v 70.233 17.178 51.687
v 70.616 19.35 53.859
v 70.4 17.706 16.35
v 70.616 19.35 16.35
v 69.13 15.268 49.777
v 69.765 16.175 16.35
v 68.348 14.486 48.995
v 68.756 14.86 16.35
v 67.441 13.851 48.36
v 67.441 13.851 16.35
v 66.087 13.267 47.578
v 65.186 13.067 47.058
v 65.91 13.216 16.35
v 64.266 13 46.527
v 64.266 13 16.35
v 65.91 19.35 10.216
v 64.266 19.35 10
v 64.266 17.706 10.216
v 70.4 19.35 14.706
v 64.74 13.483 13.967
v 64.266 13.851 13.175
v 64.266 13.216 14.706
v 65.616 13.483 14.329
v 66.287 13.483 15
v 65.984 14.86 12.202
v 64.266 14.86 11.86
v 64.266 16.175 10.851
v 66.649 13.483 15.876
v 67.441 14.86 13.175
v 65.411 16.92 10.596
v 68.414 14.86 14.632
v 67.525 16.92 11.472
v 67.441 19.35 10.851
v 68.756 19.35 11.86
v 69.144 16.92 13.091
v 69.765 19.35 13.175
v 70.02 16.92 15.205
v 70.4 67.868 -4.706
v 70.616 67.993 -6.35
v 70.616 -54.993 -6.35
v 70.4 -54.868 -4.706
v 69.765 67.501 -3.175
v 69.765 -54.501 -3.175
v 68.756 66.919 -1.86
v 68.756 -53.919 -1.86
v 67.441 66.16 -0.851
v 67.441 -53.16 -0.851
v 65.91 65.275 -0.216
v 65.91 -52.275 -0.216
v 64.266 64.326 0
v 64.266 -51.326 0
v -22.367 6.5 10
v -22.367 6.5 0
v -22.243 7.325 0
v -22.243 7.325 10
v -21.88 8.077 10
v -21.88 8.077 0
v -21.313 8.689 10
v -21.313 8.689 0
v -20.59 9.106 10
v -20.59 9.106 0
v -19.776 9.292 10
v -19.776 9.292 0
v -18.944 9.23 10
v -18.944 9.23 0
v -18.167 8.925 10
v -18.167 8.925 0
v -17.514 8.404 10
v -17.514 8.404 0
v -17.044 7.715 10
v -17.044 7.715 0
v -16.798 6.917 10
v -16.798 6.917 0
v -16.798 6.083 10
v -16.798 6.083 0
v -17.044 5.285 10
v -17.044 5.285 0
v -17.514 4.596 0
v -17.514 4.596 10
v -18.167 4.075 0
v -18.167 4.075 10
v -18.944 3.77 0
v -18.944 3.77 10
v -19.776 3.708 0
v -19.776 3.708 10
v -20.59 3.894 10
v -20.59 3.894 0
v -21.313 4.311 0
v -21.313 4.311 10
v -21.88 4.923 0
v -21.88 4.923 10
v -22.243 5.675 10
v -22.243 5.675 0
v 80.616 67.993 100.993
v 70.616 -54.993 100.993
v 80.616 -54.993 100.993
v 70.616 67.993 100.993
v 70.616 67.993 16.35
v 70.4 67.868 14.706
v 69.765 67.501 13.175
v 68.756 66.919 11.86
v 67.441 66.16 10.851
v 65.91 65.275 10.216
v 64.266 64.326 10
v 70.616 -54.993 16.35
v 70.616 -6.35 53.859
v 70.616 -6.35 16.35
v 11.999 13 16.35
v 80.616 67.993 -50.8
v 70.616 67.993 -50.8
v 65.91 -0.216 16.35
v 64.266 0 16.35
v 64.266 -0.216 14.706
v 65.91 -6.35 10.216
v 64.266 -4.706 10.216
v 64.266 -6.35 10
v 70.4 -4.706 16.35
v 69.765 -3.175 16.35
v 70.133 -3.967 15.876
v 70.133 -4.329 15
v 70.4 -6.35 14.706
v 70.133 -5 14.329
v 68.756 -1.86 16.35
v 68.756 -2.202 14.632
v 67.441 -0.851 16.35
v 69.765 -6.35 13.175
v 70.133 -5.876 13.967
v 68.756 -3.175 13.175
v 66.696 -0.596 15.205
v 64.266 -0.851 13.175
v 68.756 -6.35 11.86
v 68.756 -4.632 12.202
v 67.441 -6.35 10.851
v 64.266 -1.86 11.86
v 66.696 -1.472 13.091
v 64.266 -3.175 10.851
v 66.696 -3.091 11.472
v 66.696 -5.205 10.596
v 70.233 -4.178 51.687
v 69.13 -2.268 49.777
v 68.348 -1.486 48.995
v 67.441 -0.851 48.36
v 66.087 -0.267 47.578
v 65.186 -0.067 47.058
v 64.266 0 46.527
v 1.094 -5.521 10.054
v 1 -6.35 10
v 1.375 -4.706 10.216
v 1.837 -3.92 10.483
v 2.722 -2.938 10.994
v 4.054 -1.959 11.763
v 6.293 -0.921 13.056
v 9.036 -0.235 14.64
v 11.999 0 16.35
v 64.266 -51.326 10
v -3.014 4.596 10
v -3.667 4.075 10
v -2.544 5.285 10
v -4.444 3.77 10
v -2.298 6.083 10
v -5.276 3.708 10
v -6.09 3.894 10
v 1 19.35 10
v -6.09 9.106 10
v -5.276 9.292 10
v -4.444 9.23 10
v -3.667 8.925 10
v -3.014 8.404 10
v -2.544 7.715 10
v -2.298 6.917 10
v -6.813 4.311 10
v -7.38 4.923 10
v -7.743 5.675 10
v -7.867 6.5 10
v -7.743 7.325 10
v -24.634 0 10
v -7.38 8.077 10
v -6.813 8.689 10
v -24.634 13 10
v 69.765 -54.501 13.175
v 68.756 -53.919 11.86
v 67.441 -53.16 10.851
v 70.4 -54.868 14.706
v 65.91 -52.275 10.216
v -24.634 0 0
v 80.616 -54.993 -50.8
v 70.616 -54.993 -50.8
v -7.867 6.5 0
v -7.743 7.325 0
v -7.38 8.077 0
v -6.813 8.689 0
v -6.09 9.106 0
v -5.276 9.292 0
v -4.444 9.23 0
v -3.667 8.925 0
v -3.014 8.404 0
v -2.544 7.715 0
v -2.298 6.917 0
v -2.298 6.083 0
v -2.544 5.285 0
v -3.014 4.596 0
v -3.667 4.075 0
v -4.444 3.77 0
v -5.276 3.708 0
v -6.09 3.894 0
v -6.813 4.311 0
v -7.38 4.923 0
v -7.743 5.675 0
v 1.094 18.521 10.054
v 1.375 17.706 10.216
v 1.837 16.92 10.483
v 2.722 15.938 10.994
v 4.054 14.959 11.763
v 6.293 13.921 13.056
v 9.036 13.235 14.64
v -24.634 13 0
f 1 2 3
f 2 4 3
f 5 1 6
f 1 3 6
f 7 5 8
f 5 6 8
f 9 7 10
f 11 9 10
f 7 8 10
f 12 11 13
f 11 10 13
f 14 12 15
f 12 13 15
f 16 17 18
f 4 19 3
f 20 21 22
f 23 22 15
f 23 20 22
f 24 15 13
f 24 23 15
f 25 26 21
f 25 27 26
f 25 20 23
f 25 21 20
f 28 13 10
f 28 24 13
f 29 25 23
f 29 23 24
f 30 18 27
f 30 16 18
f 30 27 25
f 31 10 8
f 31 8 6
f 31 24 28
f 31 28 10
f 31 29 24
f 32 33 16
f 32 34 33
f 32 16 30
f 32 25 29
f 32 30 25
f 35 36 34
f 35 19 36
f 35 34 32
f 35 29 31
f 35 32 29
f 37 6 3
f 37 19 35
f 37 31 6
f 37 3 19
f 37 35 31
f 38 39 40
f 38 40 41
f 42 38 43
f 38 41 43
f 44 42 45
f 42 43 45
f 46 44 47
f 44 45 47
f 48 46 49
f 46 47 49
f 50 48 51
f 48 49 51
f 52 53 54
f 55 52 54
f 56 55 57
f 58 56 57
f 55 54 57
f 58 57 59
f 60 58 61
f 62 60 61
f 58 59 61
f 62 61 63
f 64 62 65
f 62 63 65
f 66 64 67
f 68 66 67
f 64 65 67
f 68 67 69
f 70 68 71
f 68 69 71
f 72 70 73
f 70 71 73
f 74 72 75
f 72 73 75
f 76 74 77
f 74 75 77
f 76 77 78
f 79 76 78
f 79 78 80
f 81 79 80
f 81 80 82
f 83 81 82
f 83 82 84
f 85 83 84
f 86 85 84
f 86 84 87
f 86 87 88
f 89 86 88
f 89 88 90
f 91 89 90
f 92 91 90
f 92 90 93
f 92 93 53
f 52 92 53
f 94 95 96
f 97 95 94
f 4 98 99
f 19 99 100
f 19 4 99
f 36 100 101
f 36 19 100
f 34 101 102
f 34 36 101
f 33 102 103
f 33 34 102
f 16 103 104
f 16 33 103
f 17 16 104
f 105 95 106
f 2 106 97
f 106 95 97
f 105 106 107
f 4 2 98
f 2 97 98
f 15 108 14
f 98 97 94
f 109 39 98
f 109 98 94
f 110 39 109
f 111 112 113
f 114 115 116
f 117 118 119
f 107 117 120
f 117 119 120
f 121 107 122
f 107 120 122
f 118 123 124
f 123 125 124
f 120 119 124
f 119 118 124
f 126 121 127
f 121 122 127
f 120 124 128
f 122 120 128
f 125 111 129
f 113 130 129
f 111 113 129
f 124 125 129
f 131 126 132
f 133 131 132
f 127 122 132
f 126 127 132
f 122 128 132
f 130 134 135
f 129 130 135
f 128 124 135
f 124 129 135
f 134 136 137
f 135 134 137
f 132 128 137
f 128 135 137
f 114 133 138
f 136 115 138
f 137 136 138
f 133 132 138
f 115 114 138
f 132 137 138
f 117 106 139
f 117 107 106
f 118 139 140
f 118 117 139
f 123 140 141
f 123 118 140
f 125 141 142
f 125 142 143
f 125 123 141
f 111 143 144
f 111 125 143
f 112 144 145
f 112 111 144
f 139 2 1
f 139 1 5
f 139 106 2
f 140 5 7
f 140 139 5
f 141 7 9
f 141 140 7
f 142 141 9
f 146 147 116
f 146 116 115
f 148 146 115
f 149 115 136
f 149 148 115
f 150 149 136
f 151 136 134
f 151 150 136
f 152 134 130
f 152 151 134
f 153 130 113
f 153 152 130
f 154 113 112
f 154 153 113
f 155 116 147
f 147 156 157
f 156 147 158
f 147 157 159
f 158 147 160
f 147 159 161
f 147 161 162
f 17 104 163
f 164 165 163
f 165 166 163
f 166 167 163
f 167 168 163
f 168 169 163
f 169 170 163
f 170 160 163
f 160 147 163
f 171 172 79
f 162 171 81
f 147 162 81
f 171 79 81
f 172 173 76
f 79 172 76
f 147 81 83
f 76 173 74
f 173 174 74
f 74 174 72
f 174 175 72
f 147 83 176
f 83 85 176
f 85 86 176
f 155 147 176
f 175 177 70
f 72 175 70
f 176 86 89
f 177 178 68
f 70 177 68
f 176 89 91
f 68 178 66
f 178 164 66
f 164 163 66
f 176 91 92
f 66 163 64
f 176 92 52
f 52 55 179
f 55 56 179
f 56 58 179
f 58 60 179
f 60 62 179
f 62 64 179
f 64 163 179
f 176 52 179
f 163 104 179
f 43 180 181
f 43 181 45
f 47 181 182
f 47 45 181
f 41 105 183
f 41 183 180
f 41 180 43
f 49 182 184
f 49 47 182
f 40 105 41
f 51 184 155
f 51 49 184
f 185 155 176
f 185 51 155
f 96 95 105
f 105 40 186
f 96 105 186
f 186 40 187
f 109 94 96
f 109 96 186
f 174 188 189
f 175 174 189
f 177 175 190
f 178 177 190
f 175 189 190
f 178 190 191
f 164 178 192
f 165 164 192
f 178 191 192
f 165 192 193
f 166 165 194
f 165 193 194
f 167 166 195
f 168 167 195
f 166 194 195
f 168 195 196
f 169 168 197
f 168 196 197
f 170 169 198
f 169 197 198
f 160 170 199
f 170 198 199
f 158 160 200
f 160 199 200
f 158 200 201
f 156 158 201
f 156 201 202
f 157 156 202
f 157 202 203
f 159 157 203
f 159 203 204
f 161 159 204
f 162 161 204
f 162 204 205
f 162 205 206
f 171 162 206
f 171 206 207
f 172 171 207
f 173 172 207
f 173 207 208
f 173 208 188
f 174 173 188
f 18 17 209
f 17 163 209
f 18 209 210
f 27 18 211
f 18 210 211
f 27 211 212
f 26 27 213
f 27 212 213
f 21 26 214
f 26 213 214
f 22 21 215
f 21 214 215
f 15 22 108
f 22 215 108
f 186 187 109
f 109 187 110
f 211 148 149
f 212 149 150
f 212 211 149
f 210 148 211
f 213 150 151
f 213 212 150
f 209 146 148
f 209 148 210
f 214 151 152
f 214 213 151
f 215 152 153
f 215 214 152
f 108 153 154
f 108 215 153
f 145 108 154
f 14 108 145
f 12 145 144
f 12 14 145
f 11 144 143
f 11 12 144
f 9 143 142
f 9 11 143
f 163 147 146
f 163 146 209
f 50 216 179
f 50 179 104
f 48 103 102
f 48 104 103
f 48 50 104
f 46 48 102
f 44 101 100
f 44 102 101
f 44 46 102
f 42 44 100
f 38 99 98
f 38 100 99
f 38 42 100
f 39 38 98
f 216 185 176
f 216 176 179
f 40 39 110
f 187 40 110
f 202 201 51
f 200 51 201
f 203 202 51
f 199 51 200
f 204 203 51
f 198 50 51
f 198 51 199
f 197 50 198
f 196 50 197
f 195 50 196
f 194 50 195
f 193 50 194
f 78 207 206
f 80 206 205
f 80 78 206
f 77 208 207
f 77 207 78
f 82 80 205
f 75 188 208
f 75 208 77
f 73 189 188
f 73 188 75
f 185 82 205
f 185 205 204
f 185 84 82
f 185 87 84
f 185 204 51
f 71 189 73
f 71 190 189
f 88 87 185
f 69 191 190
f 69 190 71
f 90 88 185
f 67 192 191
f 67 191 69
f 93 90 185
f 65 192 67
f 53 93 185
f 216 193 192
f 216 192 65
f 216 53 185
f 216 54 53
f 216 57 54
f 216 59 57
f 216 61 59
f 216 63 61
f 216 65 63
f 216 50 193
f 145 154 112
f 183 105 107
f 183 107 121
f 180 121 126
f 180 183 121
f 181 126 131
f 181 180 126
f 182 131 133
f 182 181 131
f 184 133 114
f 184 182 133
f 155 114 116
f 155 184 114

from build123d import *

# Parameters (mm, degrees)
BOSS_EXTRUDE1_DEPTH = 10
BOSS_EXTRUDE2_DEPTH = 13
SKETCH4_W           = 151.79281634
SKETCH4_H           = 122.98522628
BOSS_EXTRUDE3_DEPTH = 10
SKETCH5_R           = 2.8
CUT_EXTRUDE1_DEPTH  = 101.99281634
FILLET1_R           = 6.35


with BuildPart() as part:
    # Sketch1 → Boss-Extrude1 (new body)
    with BuildSketch(Plane.XY):
        Polygon((-24.634, 0), (-24.634, 13), (70.616, 67.99261314), (70.616, -54.99261314), align=None)
    extrude(amount=BOSS_EXTRUDE1_DEPTH)

    # Sketch3 → Boss-Extrude2 (add)
    with BuildSketch(Plane(origin=(0, 13, 0), x_dir=(1, 0, 0), z_dir=(0, 1, 0))):
        Polygon((70.616, -50.19281634), (70.616, -10), (1, -10), align=None)
    extrude(amount=-BOSS_EXTRUDE2_DEPTH)

    # Sketch4 → Boss-Extrude3 (add)
    with BuildSketch(Plane(origin=(70.616, 0, 0), x_dir=(0, 0, -1), z_dir=(1, 0, 0))):
        with Locations((-25.09640817, 6.5)):
            Rectangle(SKETCH4_W, SKETCH4_H)
    extrude(amount=BOSS_EXTRUDE3_DEPTH)

    # Sketch5 → Cut-Extrude1 (cut, through all)
    with BuildSketch(Plane(origin=(0, 0, 0), x_dir=(-1, 0, 0), z_dir=(0, 0, -1))):
        with Locations((5.067, 6.5)):
            Circle(SKETCH5_R)
        with Locations((19.567, 6.5)):
            Circle(SKETCH5_R)
    extrude(amount=-CUT_EXTRUDE1_DEPTH, mode=Mode.SUBTRACT)

    # Fillet1
    fillet1_edges = [part.edges().sort_by_distance(p)[0] for p in [
        (70.616, 40.49630657, 10),
        (70.616, 6.5, 50.19281634),
        (35.808, 13, 10),
        (70.616, 13, 30.09640817),
        (35.808, 0, 10),
        (70.616, 0, 30.09640817),
        (70.616, -27.49630657, 10),
        (70.616, 6.5, 0),
    ]]
    fillet(fillet1_edges, radius=FILLET1_R)


solid = part.part
